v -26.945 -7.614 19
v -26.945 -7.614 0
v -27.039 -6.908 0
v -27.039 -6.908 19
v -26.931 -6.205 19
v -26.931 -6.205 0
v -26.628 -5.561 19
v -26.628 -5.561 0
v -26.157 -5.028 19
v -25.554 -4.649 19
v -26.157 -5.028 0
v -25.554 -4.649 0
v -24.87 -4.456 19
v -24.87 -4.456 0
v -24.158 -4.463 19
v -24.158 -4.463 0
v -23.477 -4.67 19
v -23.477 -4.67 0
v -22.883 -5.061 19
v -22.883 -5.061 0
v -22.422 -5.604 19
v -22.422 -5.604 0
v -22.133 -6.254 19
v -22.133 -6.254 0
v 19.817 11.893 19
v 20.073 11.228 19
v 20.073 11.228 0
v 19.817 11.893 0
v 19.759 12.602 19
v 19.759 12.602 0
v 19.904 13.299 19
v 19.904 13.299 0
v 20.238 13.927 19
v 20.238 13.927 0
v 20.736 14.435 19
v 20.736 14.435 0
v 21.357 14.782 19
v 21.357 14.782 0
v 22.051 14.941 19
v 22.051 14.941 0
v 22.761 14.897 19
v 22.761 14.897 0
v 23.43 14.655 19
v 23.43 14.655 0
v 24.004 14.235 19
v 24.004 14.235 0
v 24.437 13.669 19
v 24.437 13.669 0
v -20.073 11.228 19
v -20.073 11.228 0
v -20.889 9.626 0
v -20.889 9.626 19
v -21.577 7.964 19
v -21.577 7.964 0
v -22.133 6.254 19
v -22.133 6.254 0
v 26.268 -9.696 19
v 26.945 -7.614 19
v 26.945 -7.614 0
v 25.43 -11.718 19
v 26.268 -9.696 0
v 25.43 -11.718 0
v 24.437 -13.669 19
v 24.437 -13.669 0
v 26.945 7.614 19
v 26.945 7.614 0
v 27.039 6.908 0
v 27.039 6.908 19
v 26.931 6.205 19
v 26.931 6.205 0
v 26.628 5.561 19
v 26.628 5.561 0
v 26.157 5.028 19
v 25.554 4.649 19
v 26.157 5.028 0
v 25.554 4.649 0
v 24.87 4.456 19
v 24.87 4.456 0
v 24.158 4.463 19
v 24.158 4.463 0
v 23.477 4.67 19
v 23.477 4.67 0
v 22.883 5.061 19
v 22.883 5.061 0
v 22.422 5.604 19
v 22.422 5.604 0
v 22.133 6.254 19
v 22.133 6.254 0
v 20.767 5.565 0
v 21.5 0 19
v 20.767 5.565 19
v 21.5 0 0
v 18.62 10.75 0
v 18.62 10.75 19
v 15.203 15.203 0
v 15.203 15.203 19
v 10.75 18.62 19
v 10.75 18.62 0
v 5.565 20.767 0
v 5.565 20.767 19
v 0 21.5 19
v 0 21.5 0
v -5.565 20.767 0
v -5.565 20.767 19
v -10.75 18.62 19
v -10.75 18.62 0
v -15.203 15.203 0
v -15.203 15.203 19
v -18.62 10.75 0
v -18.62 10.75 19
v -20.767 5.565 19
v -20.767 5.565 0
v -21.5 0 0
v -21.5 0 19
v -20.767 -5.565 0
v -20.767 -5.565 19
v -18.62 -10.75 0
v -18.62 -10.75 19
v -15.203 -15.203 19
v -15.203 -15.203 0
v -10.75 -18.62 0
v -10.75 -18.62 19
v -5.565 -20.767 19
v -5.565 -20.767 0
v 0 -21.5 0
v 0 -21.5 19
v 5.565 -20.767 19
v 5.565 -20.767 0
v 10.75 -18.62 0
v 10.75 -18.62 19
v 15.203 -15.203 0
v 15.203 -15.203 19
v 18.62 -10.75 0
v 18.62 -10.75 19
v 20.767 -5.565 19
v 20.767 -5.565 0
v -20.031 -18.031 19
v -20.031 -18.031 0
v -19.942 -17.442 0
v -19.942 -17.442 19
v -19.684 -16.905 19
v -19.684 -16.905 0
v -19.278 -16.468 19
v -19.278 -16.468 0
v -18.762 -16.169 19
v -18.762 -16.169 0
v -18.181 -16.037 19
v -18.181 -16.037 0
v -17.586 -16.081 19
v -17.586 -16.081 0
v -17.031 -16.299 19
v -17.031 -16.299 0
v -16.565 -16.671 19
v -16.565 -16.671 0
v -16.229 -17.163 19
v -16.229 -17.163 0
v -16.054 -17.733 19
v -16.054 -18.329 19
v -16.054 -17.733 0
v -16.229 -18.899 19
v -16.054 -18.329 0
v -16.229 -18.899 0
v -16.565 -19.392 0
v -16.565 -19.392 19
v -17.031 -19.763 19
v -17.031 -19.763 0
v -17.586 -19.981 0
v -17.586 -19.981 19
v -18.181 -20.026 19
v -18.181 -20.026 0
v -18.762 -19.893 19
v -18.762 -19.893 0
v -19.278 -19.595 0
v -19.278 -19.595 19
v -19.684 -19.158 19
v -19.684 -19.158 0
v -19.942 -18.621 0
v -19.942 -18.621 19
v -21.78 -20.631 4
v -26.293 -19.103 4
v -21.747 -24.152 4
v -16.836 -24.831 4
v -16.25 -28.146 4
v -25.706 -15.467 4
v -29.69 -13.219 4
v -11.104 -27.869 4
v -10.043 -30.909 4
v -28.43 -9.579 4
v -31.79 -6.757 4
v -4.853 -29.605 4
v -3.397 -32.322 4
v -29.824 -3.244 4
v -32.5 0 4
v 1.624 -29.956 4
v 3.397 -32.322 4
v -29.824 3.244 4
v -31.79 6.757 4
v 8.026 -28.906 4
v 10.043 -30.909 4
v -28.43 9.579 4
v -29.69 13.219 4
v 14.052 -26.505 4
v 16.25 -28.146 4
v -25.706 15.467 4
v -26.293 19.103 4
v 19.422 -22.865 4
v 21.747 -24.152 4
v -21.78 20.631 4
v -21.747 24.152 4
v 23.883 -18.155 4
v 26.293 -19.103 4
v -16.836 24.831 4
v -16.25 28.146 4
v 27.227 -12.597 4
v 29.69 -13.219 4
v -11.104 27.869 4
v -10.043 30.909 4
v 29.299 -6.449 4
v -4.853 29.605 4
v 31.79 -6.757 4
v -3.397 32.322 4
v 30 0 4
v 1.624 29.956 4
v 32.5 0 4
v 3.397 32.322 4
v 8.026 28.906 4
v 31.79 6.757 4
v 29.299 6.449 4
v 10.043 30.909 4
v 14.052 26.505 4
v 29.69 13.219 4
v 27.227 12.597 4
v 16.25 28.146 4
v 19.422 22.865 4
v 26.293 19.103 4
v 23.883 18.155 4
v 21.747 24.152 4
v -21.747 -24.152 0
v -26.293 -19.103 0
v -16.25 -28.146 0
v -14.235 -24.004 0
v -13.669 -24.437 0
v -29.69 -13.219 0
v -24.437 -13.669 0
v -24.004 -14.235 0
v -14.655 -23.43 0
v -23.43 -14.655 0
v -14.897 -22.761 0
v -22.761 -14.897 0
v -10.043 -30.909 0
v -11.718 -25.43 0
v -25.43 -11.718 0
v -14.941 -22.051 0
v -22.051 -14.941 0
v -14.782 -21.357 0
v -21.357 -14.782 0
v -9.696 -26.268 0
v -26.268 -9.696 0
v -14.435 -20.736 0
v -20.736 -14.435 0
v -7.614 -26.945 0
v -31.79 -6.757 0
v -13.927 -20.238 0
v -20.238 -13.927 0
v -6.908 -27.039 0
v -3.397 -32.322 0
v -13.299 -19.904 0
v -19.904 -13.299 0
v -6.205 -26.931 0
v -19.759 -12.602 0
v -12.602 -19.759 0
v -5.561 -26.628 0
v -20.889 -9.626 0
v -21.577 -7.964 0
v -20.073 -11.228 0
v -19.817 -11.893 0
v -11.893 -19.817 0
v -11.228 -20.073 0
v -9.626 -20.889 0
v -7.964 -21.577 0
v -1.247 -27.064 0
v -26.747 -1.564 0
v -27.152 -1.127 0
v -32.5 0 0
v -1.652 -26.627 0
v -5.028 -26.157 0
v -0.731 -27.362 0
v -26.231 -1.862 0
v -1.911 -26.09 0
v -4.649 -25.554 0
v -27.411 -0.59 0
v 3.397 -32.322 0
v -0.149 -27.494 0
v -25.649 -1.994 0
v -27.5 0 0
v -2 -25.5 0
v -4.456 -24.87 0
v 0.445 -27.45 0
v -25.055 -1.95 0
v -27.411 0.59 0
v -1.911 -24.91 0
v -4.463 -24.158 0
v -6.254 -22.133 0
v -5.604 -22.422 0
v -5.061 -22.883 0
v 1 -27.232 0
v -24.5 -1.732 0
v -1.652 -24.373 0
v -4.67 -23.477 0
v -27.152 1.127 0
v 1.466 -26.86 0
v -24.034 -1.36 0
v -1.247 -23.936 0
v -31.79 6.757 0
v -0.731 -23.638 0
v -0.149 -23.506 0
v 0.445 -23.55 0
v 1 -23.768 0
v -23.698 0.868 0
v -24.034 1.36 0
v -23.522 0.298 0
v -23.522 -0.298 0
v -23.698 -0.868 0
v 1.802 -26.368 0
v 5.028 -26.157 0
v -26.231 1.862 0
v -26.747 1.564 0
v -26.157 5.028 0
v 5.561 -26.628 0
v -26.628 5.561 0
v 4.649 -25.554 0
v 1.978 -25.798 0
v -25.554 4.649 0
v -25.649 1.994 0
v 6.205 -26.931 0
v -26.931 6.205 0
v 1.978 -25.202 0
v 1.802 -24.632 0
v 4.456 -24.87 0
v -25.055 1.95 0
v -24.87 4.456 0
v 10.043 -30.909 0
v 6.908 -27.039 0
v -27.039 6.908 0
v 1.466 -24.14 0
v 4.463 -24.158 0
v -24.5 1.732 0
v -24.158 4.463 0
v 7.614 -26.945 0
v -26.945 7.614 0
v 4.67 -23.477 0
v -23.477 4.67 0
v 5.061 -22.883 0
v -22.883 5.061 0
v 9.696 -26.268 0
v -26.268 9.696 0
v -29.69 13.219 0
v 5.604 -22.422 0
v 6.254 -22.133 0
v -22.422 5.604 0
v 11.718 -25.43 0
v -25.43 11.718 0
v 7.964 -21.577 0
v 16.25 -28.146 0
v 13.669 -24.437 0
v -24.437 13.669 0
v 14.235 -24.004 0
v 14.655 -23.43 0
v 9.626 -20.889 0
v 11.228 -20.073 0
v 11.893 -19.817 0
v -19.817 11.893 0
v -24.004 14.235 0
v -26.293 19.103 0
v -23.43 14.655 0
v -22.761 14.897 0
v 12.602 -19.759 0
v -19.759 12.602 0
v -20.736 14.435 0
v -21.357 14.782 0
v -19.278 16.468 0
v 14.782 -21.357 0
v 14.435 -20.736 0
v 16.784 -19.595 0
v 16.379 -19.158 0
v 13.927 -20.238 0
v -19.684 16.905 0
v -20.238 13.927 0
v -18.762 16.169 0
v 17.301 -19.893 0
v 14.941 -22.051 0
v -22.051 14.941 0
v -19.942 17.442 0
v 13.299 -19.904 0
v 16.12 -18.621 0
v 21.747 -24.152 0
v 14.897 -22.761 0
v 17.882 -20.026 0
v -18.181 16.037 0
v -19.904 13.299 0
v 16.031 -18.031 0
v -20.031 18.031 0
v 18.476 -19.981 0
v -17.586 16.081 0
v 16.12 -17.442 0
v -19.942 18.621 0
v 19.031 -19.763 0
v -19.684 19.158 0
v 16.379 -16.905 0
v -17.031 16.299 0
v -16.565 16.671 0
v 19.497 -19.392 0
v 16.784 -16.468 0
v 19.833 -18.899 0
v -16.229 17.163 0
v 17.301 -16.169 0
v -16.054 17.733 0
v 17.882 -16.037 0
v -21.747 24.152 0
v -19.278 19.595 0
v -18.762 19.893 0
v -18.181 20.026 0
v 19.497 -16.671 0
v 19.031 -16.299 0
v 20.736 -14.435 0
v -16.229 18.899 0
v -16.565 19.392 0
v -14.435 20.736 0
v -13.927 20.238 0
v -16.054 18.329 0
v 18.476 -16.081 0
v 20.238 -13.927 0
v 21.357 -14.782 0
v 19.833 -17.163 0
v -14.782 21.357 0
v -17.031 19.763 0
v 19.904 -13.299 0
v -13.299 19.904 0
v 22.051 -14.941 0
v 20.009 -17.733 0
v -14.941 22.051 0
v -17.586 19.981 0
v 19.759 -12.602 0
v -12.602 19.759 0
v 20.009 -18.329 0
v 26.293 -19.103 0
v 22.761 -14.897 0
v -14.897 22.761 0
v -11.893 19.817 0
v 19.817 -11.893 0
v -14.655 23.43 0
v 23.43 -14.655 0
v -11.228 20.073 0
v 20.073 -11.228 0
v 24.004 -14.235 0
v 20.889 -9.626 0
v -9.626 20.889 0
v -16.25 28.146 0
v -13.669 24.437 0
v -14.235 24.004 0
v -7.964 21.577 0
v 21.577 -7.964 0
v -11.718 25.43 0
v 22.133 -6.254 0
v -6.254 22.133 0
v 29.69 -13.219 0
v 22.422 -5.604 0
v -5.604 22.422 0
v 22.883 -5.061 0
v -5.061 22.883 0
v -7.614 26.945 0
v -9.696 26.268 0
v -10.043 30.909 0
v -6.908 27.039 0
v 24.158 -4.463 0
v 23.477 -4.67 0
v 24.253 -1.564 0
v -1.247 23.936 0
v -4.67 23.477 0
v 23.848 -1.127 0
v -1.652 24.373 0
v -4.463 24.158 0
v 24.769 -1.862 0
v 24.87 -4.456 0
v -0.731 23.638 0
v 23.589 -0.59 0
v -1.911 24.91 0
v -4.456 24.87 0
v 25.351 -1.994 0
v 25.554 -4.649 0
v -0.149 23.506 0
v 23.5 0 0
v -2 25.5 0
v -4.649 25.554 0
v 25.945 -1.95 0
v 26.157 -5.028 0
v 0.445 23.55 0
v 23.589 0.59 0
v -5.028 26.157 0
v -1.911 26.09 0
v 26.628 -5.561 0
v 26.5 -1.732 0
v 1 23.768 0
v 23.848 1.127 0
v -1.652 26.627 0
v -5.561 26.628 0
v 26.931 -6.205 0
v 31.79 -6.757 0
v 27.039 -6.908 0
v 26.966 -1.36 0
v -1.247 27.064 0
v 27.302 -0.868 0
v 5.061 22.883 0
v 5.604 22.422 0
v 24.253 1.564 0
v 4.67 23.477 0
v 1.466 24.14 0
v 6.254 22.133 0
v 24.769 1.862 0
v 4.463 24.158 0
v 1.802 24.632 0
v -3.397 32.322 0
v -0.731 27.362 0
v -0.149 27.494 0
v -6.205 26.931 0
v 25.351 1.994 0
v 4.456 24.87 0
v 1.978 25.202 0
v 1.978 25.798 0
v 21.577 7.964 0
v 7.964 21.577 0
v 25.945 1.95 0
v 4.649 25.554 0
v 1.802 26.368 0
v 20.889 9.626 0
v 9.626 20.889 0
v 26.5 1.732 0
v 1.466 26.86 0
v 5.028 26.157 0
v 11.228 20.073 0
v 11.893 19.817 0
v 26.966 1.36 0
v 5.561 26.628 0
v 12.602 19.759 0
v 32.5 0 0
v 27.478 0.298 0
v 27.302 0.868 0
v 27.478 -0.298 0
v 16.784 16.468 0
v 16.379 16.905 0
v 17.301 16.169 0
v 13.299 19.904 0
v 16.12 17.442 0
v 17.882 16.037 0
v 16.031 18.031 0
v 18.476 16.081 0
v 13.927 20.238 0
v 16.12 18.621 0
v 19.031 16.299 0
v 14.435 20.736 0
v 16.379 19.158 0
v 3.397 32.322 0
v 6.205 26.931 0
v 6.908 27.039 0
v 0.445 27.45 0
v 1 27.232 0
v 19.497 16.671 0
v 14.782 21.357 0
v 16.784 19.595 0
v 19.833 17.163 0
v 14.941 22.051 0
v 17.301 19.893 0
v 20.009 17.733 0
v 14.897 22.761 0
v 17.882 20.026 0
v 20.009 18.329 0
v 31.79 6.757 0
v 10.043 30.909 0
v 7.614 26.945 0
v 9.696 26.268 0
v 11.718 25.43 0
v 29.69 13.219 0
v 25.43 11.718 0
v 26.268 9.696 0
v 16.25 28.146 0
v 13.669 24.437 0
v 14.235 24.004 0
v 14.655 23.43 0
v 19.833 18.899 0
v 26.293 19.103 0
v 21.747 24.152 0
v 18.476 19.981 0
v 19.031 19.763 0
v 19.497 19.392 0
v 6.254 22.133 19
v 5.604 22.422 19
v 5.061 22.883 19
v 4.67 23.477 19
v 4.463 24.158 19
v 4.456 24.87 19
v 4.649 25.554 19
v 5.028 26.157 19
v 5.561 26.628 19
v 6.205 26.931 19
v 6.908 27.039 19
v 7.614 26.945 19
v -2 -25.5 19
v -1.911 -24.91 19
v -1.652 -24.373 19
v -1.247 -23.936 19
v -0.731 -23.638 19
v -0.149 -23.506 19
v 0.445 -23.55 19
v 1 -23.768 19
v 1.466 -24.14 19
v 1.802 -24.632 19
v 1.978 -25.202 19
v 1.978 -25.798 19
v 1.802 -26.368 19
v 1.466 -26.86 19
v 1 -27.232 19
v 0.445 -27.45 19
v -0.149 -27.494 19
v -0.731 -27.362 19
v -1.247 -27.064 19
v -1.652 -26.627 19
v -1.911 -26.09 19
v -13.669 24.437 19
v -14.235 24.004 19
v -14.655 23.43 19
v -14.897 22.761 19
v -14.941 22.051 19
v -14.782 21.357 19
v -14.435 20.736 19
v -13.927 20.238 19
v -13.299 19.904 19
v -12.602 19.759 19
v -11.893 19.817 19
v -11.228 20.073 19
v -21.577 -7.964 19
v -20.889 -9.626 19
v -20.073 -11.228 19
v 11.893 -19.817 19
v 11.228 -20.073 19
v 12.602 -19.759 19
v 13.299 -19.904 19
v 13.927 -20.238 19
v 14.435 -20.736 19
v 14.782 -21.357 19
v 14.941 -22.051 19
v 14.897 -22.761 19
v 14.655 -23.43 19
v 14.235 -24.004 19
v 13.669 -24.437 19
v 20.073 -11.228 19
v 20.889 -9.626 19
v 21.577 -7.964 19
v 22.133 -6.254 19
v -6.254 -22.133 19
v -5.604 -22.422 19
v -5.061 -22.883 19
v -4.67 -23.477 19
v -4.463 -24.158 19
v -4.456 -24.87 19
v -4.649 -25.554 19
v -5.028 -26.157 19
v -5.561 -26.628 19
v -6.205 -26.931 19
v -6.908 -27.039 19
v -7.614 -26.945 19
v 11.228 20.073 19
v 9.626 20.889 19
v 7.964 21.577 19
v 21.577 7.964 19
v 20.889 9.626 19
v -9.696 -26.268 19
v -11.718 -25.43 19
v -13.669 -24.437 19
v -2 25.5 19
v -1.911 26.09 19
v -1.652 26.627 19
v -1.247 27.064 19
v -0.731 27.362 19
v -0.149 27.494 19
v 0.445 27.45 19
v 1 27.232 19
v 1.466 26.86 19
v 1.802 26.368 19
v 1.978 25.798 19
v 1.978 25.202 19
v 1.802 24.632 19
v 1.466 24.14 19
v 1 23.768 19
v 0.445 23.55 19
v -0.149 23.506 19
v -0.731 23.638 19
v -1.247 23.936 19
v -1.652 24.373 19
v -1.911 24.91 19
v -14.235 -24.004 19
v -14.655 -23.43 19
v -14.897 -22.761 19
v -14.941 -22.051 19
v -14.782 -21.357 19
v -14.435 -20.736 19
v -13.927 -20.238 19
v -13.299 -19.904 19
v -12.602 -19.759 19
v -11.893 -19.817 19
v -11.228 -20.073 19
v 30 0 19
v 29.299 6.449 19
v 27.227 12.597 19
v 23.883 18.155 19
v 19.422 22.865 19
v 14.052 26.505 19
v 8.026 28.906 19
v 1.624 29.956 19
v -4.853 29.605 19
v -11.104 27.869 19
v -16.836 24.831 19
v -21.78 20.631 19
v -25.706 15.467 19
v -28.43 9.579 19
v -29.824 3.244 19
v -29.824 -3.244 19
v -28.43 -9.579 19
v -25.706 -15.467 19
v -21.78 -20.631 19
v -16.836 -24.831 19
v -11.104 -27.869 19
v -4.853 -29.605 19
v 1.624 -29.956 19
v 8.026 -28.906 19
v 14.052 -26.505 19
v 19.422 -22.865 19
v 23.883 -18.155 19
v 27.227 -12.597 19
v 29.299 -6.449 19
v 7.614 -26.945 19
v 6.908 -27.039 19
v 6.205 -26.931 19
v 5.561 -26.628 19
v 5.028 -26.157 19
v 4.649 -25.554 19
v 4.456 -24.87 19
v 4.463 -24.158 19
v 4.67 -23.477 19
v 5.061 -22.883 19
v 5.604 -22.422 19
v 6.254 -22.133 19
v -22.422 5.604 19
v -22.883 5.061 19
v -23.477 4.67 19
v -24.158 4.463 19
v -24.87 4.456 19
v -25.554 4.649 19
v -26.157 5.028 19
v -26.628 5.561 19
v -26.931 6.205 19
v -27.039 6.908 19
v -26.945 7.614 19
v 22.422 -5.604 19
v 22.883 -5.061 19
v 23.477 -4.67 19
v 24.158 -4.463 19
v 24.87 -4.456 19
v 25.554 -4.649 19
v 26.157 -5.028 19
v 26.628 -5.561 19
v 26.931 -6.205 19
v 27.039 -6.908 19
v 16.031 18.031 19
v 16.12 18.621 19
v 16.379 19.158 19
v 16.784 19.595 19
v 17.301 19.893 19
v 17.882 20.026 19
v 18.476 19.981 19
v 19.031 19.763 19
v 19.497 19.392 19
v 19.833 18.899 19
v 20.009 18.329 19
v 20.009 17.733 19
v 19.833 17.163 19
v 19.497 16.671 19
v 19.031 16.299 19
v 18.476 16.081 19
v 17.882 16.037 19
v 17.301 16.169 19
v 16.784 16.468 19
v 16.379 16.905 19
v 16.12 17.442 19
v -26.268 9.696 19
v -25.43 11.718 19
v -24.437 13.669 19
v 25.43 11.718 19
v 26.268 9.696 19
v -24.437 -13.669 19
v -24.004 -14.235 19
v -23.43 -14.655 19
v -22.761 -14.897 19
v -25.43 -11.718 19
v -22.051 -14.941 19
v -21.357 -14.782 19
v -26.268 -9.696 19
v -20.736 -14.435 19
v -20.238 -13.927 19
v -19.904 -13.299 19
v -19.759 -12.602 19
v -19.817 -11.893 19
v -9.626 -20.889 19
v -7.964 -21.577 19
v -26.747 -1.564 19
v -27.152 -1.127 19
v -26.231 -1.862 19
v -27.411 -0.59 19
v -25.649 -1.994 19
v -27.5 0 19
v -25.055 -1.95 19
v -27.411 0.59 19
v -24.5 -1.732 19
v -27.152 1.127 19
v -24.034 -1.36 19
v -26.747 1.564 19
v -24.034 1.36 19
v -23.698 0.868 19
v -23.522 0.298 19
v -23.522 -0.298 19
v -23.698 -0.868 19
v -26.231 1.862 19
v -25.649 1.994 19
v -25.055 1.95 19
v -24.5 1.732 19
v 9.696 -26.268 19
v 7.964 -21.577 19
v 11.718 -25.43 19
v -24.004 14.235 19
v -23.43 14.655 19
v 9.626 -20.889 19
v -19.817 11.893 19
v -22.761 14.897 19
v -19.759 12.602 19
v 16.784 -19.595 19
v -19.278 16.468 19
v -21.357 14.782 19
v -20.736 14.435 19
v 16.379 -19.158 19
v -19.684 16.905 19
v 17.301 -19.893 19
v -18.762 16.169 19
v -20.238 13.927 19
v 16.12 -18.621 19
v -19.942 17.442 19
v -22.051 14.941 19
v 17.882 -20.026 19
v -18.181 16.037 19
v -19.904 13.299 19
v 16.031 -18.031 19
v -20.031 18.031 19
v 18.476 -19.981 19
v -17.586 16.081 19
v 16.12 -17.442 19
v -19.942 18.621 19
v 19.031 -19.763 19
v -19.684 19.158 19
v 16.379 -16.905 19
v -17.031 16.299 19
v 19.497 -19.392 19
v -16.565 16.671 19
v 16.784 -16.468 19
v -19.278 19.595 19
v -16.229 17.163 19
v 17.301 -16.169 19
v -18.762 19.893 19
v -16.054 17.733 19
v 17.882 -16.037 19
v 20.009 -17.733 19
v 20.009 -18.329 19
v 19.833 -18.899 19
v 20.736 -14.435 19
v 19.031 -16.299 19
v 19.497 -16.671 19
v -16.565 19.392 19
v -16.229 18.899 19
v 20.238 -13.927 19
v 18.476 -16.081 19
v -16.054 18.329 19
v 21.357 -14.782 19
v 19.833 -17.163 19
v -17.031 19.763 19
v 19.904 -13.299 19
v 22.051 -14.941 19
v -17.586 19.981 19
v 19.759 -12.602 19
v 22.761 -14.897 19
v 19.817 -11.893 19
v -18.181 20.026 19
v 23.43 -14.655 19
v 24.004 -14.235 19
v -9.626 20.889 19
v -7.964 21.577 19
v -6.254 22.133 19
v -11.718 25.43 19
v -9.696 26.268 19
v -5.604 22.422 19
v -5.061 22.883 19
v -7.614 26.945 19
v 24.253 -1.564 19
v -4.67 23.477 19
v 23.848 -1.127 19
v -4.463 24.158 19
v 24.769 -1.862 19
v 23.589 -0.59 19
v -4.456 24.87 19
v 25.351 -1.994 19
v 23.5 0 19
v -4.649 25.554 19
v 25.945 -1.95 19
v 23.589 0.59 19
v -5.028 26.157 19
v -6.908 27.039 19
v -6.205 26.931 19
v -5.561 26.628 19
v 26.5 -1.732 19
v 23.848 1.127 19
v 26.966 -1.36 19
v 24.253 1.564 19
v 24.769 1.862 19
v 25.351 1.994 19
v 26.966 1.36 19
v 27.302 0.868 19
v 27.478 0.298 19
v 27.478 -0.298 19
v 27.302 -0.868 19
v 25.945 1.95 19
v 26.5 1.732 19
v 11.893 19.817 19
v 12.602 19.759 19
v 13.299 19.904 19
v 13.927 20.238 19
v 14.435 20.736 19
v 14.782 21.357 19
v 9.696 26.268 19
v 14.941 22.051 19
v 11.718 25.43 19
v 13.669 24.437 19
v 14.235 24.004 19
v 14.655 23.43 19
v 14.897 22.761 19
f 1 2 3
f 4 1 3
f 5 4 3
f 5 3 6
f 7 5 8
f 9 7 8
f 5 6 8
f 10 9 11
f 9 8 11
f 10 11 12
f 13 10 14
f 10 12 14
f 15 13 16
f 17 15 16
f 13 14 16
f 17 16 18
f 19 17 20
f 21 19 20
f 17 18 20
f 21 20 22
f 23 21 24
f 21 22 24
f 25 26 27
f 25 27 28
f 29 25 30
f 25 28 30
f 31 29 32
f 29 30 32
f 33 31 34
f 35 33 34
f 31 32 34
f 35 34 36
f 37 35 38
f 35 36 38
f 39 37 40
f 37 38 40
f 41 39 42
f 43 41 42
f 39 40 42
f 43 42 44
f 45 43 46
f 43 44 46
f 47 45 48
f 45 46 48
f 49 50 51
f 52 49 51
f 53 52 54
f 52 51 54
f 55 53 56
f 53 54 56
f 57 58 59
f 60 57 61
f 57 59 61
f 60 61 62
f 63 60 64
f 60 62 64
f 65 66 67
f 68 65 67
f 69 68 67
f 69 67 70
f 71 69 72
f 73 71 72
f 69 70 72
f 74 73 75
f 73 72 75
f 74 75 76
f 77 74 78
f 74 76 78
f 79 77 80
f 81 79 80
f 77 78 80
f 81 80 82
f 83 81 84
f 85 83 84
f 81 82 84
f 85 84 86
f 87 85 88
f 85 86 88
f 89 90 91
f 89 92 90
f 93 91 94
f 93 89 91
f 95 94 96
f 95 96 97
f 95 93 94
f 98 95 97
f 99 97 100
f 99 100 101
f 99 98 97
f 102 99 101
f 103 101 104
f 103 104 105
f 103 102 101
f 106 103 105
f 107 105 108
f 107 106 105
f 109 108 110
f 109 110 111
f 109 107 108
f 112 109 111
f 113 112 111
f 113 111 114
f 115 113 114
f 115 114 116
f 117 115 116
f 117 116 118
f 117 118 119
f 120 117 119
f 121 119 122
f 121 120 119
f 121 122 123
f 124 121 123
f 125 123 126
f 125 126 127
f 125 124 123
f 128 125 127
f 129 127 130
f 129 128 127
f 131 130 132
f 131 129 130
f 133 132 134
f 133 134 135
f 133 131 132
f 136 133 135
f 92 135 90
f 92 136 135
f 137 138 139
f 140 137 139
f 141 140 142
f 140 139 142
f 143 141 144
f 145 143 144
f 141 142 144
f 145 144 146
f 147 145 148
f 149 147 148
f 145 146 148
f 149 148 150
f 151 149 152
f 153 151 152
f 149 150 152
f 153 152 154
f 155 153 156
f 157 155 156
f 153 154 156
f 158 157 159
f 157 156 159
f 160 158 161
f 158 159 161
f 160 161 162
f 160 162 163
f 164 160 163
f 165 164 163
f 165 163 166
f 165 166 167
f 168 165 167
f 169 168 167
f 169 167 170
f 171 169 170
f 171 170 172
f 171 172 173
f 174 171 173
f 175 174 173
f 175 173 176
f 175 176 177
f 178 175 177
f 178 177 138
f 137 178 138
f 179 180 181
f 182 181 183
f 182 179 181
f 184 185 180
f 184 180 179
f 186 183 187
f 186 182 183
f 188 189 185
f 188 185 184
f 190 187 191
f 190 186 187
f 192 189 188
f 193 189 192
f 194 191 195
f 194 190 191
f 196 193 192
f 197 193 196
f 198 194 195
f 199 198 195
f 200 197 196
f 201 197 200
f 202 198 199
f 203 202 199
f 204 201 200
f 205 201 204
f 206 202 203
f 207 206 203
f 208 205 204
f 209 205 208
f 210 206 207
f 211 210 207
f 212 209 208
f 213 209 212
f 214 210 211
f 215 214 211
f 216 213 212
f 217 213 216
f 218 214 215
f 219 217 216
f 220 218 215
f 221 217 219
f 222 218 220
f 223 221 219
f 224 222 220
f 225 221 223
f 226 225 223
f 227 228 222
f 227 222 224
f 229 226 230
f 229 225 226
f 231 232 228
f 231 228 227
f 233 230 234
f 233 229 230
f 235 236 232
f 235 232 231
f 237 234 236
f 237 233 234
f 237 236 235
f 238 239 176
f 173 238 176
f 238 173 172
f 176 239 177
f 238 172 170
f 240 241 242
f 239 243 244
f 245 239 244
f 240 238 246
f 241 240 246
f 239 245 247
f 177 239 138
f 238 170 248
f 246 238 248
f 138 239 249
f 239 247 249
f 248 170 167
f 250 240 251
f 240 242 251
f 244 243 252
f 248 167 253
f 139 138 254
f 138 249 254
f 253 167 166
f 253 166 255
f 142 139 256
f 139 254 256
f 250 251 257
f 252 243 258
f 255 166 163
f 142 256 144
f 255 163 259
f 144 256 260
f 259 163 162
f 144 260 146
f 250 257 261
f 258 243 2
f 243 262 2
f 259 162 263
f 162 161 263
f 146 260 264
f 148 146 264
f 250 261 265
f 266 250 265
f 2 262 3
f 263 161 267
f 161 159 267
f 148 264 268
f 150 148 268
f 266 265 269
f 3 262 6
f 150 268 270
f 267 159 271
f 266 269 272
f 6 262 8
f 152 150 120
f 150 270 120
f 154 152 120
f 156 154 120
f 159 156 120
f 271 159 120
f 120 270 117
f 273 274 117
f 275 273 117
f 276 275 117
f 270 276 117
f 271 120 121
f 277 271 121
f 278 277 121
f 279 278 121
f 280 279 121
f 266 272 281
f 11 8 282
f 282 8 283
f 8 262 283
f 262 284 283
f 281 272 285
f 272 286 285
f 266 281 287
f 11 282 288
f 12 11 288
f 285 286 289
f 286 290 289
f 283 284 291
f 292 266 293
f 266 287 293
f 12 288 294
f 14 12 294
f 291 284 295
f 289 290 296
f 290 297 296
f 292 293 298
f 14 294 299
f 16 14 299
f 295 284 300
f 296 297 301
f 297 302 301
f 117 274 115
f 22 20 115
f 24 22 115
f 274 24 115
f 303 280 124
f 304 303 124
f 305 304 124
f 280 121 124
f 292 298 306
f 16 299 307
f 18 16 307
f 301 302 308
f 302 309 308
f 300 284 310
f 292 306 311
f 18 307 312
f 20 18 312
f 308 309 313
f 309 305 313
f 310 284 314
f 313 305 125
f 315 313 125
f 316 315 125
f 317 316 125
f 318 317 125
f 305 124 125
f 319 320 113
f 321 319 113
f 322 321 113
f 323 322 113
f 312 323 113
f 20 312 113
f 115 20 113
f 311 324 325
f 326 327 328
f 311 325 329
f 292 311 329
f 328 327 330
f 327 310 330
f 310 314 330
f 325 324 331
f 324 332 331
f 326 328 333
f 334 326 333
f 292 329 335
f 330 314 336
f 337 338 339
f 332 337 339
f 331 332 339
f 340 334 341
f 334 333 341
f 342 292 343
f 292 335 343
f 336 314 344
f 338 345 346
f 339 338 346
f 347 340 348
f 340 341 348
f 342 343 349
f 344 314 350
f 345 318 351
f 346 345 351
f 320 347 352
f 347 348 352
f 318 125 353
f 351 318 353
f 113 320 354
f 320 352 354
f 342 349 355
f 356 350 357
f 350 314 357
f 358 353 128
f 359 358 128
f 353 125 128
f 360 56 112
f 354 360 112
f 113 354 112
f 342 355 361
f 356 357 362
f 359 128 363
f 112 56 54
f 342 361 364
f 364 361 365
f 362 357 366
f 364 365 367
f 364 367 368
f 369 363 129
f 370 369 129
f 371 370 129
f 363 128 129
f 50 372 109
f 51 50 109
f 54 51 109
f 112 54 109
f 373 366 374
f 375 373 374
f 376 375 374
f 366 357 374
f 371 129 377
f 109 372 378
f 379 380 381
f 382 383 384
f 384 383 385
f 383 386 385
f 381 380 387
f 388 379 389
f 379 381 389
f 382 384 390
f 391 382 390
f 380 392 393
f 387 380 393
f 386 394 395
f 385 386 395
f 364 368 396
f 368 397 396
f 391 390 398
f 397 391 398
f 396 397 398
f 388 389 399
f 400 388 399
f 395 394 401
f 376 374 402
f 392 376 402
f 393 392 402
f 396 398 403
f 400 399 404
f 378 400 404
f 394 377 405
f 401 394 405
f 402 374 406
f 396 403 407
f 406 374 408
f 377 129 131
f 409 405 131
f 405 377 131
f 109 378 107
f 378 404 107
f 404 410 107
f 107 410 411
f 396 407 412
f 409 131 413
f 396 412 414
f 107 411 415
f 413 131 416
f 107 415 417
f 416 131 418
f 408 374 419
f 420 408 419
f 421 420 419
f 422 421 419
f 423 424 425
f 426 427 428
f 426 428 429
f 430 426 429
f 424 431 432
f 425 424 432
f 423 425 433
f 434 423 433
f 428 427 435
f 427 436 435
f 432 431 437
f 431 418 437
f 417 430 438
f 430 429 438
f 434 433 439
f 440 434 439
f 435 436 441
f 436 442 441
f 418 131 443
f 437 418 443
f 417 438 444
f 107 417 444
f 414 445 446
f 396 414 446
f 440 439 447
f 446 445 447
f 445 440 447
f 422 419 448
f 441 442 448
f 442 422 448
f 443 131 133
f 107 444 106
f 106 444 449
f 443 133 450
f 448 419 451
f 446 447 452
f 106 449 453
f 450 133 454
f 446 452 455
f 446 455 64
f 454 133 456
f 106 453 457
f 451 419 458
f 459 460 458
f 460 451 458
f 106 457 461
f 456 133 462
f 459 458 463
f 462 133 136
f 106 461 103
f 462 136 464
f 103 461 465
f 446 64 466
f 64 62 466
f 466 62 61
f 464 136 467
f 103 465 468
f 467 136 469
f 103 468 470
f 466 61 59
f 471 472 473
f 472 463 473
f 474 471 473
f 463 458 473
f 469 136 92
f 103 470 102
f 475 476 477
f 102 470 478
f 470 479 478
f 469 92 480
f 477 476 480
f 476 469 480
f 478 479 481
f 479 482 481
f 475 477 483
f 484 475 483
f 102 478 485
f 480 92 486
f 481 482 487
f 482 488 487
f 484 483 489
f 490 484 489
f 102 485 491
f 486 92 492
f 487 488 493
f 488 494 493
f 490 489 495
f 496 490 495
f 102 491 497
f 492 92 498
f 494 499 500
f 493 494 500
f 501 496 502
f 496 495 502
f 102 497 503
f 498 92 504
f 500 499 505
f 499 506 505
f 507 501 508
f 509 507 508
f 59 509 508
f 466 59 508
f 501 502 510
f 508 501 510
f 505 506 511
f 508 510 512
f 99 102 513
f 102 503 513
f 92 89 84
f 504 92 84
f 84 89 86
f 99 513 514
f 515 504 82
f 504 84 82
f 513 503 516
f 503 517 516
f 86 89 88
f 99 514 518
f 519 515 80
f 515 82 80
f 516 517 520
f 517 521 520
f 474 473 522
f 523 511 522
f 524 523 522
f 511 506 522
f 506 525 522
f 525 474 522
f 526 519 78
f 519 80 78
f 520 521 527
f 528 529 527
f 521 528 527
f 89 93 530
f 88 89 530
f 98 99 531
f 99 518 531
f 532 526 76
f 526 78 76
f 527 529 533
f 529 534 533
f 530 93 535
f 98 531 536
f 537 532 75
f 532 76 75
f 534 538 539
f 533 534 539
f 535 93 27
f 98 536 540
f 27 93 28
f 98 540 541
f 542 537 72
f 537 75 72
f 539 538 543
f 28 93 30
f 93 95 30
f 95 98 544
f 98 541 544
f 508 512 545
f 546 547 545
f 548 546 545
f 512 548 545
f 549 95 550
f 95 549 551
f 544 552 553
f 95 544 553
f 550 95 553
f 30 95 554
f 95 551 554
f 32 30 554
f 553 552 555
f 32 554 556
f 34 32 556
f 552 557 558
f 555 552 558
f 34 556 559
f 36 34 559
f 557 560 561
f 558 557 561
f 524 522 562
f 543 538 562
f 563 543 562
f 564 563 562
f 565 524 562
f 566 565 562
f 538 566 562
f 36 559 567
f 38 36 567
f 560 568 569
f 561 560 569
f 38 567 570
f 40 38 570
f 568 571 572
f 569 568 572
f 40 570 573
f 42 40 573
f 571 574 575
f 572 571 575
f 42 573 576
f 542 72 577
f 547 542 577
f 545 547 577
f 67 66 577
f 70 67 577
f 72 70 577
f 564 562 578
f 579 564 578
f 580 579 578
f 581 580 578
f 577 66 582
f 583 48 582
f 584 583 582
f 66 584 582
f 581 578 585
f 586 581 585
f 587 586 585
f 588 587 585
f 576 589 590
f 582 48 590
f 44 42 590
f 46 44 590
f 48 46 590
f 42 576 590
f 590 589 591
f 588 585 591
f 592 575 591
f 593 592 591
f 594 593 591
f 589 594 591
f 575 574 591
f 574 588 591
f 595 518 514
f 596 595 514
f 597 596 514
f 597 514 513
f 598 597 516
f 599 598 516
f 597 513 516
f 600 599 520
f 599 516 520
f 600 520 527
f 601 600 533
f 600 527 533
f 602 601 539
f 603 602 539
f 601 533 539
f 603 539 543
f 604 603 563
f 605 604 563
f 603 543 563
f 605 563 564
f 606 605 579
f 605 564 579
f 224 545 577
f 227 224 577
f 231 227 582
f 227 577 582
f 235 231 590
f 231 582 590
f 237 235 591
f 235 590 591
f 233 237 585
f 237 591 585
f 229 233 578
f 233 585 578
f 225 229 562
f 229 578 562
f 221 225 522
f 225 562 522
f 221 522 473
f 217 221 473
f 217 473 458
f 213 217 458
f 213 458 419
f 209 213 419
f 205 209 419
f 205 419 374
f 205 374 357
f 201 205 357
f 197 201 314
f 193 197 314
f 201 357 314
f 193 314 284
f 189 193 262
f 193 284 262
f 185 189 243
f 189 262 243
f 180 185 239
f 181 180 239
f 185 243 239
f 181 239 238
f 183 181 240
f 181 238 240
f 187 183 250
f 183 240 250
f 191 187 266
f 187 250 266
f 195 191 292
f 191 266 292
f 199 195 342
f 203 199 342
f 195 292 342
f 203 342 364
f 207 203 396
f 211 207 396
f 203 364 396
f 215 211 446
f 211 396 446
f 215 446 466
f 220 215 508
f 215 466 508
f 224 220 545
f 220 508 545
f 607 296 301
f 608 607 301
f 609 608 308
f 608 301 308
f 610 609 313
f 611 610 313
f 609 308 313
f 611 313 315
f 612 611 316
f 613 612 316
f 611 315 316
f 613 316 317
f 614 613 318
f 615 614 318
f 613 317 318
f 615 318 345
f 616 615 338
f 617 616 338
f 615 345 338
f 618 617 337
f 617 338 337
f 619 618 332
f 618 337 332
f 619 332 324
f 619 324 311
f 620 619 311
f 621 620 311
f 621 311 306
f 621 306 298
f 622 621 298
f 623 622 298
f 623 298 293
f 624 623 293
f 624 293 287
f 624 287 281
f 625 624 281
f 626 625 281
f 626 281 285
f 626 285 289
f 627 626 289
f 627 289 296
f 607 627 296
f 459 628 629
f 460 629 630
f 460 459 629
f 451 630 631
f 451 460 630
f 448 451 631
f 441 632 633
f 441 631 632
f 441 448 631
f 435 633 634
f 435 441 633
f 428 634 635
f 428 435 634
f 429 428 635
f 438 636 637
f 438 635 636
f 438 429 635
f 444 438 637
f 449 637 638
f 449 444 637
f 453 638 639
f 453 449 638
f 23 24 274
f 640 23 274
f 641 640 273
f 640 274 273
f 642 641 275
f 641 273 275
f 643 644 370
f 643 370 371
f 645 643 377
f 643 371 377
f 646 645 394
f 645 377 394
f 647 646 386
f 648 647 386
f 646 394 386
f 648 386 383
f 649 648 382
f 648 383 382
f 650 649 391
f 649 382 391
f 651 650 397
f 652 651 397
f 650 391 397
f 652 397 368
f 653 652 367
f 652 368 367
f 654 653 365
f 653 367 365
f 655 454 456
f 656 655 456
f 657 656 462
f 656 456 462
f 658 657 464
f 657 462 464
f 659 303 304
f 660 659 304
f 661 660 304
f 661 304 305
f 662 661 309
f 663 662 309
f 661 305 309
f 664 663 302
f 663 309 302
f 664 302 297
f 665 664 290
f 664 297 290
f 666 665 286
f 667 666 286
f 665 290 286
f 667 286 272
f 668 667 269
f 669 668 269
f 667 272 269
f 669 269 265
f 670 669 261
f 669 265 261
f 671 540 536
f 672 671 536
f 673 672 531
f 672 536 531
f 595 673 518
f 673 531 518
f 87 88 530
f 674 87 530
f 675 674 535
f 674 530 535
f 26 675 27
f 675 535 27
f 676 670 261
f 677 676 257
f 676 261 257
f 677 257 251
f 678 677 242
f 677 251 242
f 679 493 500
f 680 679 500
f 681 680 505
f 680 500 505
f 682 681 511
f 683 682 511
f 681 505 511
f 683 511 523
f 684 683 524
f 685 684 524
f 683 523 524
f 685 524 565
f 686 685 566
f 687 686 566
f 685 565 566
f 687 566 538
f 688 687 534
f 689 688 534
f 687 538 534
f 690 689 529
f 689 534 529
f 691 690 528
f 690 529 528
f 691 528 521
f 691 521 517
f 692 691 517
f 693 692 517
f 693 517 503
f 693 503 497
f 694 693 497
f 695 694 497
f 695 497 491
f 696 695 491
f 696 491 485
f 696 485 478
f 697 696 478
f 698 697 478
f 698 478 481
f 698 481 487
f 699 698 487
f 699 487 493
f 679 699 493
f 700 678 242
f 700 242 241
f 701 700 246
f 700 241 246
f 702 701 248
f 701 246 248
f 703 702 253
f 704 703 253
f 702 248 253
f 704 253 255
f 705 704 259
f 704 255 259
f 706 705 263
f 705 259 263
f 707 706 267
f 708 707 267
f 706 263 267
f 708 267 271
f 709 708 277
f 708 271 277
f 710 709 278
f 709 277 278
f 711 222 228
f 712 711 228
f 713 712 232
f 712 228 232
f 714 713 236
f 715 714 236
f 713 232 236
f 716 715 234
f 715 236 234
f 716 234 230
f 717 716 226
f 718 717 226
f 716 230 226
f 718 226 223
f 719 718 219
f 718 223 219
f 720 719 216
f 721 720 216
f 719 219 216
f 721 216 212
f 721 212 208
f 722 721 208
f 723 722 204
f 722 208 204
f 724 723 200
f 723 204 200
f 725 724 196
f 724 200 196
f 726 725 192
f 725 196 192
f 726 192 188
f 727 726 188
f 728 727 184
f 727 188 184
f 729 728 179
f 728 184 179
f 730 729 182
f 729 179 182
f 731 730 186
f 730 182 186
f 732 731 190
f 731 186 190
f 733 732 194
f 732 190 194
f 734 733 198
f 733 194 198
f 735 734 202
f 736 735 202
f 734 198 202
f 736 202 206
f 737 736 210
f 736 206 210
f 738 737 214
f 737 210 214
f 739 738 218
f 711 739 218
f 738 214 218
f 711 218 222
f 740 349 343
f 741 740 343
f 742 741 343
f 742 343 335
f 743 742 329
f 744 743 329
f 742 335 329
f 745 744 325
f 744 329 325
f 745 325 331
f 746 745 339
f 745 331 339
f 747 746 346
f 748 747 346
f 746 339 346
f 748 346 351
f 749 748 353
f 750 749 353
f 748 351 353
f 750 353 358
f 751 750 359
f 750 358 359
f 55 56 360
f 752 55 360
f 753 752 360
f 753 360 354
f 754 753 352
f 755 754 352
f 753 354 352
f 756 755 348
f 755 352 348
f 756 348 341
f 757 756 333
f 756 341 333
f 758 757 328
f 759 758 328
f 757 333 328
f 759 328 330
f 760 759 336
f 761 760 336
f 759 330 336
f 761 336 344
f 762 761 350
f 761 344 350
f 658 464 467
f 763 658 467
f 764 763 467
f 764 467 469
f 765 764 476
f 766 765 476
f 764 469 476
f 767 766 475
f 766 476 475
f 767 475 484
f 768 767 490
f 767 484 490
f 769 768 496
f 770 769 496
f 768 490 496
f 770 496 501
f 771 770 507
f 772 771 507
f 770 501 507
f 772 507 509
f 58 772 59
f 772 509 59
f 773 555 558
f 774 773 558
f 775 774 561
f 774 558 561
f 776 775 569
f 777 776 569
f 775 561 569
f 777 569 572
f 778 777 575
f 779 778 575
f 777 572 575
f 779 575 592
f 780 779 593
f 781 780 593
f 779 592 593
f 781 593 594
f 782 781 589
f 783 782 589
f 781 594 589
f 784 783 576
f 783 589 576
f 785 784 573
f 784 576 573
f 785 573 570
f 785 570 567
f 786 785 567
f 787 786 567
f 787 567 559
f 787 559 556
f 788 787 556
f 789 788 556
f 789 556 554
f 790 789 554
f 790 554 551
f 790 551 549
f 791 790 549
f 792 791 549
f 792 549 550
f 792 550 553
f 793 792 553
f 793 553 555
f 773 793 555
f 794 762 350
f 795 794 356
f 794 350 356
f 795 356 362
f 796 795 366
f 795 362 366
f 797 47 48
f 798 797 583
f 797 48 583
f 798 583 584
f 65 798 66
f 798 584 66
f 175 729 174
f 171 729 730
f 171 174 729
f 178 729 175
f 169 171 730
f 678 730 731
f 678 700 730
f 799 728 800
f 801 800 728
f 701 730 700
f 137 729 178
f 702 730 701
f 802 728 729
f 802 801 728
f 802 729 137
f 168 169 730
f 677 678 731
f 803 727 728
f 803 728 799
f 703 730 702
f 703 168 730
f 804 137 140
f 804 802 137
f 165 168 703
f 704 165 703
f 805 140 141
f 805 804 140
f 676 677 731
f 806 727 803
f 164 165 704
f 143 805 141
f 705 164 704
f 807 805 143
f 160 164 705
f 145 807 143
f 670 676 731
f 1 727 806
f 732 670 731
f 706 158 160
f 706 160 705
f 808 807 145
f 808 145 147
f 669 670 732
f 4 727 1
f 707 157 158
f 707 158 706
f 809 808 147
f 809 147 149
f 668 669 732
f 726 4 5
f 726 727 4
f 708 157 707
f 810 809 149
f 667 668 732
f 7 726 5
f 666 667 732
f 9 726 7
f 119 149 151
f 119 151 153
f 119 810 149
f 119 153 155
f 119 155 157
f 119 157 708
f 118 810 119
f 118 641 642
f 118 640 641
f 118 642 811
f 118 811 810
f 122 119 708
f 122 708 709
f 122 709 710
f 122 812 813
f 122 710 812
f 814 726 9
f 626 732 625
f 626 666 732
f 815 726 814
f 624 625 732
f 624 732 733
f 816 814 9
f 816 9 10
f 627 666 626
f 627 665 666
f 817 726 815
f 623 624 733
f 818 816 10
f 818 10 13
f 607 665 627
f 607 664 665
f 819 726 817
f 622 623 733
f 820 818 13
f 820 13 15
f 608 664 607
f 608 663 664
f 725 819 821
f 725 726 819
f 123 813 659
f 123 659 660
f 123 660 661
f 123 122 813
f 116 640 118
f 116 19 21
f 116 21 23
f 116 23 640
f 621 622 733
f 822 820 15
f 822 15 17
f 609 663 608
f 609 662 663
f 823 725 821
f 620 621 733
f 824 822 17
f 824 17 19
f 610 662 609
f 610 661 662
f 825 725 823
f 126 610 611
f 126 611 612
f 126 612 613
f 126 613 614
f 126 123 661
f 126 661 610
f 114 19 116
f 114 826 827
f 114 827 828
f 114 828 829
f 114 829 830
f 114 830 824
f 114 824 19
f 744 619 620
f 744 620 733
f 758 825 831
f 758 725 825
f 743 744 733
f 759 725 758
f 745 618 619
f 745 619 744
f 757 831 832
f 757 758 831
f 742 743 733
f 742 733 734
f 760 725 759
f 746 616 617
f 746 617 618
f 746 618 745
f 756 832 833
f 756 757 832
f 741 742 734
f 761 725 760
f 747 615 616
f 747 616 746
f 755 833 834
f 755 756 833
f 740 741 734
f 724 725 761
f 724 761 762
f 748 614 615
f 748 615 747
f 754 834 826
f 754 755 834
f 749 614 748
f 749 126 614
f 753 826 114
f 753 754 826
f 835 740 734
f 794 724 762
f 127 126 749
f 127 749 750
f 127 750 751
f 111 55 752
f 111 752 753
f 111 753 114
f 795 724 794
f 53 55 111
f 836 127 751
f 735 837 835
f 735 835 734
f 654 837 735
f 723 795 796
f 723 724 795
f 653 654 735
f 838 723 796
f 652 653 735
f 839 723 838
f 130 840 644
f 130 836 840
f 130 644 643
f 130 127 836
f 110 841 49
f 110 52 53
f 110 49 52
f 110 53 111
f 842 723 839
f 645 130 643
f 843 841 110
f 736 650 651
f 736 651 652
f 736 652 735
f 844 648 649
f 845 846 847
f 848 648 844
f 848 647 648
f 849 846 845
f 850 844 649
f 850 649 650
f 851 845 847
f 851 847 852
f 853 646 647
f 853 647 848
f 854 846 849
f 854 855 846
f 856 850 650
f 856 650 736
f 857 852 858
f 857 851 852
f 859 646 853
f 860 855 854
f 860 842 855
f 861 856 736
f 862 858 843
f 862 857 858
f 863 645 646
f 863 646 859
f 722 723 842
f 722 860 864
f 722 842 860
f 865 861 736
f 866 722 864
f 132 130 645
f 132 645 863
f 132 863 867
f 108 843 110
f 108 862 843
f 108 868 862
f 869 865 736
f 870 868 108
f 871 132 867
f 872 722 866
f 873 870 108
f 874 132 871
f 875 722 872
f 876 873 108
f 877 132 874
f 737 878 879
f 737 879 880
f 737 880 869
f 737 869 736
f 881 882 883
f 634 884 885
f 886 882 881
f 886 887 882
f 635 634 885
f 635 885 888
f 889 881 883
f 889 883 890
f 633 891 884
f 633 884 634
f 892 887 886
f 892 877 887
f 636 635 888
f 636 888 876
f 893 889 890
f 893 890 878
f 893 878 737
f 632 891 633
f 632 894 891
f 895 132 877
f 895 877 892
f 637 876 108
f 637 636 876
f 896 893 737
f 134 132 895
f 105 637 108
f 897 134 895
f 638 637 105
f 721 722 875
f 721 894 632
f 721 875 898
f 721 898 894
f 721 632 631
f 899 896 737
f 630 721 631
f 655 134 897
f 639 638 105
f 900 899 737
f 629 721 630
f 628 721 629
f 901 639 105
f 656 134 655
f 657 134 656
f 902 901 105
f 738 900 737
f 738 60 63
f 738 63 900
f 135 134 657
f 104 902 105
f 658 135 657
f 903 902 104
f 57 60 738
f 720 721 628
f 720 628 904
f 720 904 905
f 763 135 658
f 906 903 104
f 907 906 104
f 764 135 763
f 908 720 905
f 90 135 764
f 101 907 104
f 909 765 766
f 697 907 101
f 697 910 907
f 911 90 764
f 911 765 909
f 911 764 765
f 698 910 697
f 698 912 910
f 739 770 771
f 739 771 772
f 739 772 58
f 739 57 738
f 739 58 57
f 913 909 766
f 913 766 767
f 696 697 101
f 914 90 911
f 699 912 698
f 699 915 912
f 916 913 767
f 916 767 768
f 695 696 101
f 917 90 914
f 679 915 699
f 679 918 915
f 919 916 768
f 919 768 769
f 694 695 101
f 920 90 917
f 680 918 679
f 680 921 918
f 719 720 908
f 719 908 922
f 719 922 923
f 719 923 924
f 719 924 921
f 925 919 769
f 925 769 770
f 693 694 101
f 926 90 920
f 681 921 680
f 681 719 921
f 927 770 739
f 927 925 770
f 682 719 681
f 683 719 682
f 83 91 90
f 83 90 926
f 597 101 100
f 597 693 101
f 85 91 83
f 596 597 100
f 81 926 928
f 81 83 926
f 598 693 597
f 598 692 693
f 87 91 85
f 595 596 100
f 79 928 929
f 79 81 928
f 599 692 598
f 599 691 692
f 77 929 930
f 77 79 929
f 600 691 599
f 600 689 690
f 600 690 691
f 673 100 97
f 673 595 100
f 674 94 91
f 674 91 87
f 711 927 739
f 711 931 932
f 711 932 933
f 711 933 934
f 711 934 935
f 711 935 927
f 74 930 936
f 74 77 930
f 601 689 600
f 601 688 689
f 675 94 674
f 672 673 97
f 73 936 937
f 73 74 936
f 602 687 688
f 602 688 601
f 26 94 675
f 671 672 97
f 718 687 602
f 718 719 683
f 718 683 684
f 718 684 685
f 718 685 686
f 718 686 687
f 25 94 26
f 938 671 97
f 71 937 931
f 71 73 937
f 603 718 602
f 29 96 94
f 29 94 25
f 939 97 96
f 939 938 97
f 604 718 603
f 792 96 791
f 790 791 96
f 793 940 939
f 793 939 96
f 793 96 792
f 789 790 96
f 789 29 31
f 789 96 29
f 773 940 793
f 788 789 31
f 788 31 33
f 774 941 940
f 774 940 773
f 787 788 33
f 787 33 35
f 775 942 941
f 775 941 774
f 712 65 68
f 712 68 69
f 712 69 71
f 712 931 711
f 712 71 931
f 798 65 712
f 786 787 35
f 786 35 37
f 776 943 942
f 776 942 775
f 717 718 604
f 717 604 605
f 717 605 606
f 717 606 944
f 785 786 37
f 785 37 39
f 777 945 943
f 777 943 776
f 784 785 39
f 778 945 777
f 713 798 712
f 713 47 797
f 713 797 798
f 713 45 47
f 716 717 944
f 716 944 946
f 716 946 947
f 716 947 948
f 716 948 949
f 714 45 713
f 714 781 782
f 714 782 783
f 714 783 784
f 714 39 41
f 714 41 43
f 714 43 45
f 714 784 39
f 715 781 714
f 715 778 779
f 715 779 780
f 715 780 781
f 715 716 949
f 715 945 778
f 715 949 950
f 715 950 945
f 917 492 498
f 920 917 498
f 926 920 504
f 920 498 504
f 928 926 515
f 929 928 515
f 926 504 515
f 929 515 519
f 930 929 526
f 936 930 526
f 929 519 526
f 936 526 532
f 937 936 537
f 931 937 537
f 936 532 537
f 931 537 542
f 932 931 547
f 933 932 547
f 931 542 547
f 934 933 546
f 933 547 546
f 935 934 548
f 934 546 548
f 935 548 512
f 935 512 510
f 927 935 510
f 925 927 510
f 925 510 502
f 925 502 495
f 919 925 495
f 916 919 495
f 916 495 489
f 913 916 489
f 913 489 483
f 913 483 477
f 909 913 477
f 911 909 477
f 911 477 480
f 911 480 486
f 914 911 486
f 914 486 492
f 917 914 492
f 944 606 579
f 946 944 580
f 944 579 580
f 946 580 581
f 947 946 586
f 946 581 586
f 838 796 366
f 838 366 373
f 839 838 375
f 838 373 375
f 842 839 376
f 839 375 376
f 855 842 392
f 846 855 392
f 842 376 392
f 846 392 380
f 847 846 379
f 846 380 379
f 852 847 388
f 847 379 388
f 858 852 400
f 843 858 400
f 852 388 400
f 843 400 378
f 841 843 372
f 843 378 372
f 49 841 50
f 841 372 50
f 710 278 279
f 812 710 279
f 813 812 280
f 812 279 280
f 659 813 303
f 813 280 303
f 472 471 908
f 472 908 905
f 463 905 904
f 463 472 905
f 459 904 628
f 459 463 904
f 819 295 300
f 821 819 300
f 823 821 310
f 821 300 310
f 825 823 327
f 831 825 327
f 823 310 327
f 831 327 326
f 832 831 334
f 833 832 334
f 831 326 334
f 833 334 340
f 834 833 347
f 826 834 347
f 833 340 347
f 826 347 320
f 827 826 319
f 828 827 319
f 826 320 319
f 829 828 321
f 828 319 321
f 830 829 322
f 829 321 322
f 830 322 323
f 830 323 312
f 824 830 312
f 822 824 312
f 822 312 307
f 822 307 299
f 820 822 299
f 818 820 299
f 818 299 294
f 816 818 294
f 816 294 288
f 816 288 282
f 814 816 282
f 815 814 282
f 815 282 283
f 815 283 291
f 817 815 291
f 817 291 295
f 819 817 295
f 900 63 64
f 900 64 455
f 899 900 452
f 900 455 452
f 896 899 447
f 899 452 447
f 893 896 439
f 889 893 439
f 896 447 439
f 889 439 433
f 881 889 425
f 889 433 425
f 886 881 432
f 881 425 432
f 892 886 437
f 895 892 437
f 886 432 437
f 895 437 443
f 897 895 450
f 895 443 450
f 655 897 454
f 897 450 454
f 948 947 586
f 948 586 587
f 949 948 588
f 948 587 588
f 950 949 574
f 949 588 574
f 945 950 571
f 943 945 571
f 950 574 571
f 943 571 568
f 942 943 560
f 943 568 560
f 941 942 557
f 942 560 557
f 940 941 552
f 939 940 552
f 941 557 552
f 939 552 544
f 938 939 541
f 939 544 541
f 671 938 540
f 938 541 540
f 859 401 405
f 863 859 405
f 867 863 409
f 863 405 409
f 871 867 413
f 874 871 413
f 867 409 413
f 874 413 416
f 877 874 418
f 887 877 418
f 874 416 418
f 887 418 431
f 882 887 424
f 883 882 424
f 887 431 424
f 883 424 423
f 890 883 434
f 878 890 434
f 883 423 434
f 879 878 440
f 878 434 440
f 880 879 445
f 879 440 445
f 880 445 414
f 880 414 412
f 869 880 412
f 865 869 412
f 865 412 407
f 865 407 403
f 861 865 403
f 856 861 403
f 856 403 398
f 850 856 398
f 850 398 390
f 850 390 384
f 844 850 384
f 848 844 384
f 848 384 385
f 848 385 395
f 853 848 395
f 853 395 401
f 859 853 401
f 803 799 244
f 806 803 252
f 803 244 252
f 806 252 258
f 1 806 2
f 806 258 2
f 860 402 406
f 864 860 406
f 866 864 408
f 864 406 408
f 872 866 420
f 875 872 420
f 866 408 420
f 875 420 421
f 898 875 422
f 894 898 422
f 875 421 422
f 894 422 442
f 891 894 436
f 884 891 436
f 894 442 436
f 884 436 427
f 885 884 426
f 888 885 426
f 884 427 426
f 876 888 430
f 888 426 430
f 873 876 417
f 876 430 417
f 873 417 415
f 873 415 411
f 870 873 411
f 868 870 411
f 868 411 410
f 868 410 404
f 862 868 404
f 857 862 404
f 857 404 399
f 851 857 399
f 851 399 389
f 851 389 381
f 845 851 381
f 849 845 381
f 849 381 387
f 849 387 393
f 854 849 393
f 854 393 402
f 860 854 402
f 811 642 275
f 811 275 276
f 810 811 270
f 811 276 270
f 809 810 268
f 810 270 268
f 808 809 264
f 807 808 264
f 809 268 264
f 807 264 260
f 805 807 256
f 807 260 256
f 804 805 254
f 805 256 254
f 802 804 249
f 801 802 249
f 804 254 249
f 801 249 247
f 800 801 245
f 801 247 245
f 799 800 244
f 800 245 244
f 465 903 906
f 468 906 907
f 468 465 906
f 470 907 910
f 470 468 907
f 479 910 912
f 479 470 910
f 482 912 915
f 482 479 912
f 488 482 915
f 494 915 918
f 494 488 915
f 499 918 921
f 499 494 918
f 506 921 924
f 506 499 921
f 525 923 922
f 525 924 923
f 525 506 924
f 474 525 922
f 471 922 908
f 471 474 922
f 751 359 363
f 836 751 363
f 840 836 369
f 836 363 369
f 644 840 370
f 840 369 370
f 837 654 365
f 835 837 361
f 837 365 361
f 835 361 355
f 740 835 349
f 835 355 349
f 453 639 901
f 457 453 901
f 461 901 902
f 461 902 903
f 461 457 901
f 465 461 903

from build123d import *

# Parameters (mm, degrees)
SKETCH_1_R          = 32.5
SKETCH_1_R_2        = 21.5
EXTRUDE_1_DEPTH     = 4
SKETCH_2_R          = 30
SKETCH_2_R_2        = 21.5
EXTRUDE_2_DEPTH     = 15
SKETCH_3_R          = 2
CUT_EXTRUDE_1_DEPTH = 50.734294003


with BuildPart() as part:
    # 草图1 → 凸台-拉伸1 (new body)
    with BuildSketch(Plane.XY):
        Circle(SKETCH_1_R)
        Circle(SKETCH_1_R_2, mode=Mode.SUBTRACT)
    extrude(amount=EXTRUDE_1_DEPTH)

    # 草图2 → 凸台-拉伸2 (add)
    with BuildSketch(Plane.XY.offset(4)):
        Circle(SKETCH_2_R)
        Circle(SKETCH_2_R_2, mode=Mode.SUBTRACT)
    extrude(amount=EXTRUDE_2_DEPTH)

    # 草图3 → 切除-拉伸1 (cut, through all)
    with BuildSketch(Plane(origin=(0, 0, 0), x_dir=(-1, 0, 0), z_dir=(0, 0, -1))):
        with Locations((18.03122292, 18.03122292)):
            Circle(SKETCH_3_R)
        with Locations((25.5, 0)):
            Circle(SKETCH_3_R)
        with Locations((18.03122292, -18.03122292)):
            Circle(SKETCH_3_R)
        with Locations((0, -25.5)):
            Circle(SKETCH_3_R)
        with Locations((-18.03122292, -18.03122292)):
            Circle(SKETCH_3_R)
        with Locations((-25.5, 0)):
            Circle(SKETCH_3_R)
        with Locations((-18.03122292, 18.03122292)):
            Circle(SKETCH_3_R)
        with Locations((0, 25.5)):
            Circle(SKETCH_3_R)
        with BuildLine():
            ThreePointArc((7.613529763, 26.945021146), (10.715136106, 25.86862691), (13.669428647, 24.436585696))
            ThreePointArc((13.669428647, 24.436585696), (14.630781955, 21.034262987), (11.228459246, 20.072909679))
            ThreePointArc((11.228459246, 20.072909679), (8.801718944, 21.249229248), (6.253970877, 22.133410227))
            ThreePointArc((6.253970877, 22.133410227), (4.527944861, 25.218995129), (7.613529763, 26.945021146))
        make_face()
        with BuildLine():
            ThreePointArc((24.436585696, 13.669428647), (21.034262987, 14.630781955), (20.072909679, 11.228459246))
            ThreePointArc((20.072909679, 11.228459246), (21.249229248, 8.801718944), (22.133410227, 6.253970877))
            ThreePointArc((22.133410227, 6.253970877), (25.218995129, 4.527944861), (26.945021146, 7.613529763))
            ThreePointArc((26.945021146, 7.613529763), (25.86862691, 10.715136106), (24.436585696, 13.669428647))
        make_face()
        with BuildLine():
            ThreePointArc((26.945021146, -7.613529763), (25.218995129, -4.527944861), (22.133410227, -6.253970877))
            ThreePointArc((22.133410227, -6.253970877), (21.249229248, -8.801718944), (20.072909679, -11.228459246))
            ThreePointArc((20.072909679, -11.228459246), (21.034262987, -14.630781955), (24.436585696, -13.669428647))
            ThreePointArc((24.436585696, -13.669428647), (25.86862691, -10.715136106), (26.945021146, -7.613529763))
        make_face()
        with BuildLine():
            ThreePointArc((13.669428647, -24.436585696), (14.630781955, -21.034262987), (11.228459246, -20.072909679))
            ThreePointArc((11.228459246, -20.072909679), (8.801718944, -21.249229248), (6.253970877, -22.133410227))
            ThreePointArc((6.253970877, -22.133410227), (4.527944861, -25.218995129), (7.613529763, -26.945021146))
            ThreePointArc((7.613529763, -26.945021146), (10.715136106, -25.86862691), (13.669428647, -24.436585696))
        make_face()
        with BuildLine():
            ThreePointArc((-7.613529763, -26.945021146), (-4.527944861, -25.218995129), (-6.253970877, -22.133410227))
            ThreePointArc((-6.253970877, -22.133410227), (-8.801718944, -21.249229248), (-11.228459246, -20.072909679))
            ThreePointArc((-11.228459246, -20.072909679), (-14.630781955, -21.034262987), (-13.669428647, -24.436585696))
            ThreePointArc((-13.669428647, -24.436585696), (-10.715136106, -25.86862691), (-7.613529763, -26.945021146))
        make_face()
        with BuildLine():
            ThreePointArc((-24.436585696, -13.669428647), (-21.034262987, -14.630781955), (-20.072909679, -11.228459246))
            ThreePointArc((-20.072909679, -11.228459246), (-21.249229248, -8.801718944), (-22.133410227, -6.253970877))
            ThreePointArc((-22.133410227, -6.253970877), (-25.218995129, -4.527944861), (-26.945021146, -7.613529763))
            ThreePointArc((-26.945021146, -7.613529763), (-25.86862691, -10.715136106), (-24.436585696, -13.669428647))
        make_face()
        with BuildLine():
            ThreePointArc((-26.945021146, 7.613529763), (-25.218995129, 4.527944861), (-22.133410227, 6.253970877))
            ThreePointArc((-22.133410227, 6.253970877), (-21.249229248, 8.801718944), (-20.072909679, 11.228459246))
            ThreePointArc((-20.072909679, 11.228459246), (-21.034262987, 14.630781955), (-24.436585696, 13.669428647))
            ThreePointArc((-24.436585696, 13.669428647), (-25.86862691, 10.715136106), (-26.945021146, 7.613529763))
        make_face()
        with BuildLine():
            ThreePointArc((-13.669428647, 24.436585696), (-14.630781955, 21.034262987), (-11.228459246, 20.072909679))
            ThreePointArc((-11.228459246, 20.072909679), (-8.801718944, 21.249229248), (-6.253970877, 22.133410227))
            ThreePointArc((-6.253970877, 22.133410227), (-4.527944861, 25.218995129), (-7.613529763, 26.945021146))
            ThreePointArc((-7.613529763, 26.945021146), (-10.715136106, 25.86862691), (-13.669428647, 24.436585696))
        make_face()
    extrude(amount=-CUT_EXTRUDE_1_DEPTH, mode=Mode.SUBTRACT)


solid = part.part
